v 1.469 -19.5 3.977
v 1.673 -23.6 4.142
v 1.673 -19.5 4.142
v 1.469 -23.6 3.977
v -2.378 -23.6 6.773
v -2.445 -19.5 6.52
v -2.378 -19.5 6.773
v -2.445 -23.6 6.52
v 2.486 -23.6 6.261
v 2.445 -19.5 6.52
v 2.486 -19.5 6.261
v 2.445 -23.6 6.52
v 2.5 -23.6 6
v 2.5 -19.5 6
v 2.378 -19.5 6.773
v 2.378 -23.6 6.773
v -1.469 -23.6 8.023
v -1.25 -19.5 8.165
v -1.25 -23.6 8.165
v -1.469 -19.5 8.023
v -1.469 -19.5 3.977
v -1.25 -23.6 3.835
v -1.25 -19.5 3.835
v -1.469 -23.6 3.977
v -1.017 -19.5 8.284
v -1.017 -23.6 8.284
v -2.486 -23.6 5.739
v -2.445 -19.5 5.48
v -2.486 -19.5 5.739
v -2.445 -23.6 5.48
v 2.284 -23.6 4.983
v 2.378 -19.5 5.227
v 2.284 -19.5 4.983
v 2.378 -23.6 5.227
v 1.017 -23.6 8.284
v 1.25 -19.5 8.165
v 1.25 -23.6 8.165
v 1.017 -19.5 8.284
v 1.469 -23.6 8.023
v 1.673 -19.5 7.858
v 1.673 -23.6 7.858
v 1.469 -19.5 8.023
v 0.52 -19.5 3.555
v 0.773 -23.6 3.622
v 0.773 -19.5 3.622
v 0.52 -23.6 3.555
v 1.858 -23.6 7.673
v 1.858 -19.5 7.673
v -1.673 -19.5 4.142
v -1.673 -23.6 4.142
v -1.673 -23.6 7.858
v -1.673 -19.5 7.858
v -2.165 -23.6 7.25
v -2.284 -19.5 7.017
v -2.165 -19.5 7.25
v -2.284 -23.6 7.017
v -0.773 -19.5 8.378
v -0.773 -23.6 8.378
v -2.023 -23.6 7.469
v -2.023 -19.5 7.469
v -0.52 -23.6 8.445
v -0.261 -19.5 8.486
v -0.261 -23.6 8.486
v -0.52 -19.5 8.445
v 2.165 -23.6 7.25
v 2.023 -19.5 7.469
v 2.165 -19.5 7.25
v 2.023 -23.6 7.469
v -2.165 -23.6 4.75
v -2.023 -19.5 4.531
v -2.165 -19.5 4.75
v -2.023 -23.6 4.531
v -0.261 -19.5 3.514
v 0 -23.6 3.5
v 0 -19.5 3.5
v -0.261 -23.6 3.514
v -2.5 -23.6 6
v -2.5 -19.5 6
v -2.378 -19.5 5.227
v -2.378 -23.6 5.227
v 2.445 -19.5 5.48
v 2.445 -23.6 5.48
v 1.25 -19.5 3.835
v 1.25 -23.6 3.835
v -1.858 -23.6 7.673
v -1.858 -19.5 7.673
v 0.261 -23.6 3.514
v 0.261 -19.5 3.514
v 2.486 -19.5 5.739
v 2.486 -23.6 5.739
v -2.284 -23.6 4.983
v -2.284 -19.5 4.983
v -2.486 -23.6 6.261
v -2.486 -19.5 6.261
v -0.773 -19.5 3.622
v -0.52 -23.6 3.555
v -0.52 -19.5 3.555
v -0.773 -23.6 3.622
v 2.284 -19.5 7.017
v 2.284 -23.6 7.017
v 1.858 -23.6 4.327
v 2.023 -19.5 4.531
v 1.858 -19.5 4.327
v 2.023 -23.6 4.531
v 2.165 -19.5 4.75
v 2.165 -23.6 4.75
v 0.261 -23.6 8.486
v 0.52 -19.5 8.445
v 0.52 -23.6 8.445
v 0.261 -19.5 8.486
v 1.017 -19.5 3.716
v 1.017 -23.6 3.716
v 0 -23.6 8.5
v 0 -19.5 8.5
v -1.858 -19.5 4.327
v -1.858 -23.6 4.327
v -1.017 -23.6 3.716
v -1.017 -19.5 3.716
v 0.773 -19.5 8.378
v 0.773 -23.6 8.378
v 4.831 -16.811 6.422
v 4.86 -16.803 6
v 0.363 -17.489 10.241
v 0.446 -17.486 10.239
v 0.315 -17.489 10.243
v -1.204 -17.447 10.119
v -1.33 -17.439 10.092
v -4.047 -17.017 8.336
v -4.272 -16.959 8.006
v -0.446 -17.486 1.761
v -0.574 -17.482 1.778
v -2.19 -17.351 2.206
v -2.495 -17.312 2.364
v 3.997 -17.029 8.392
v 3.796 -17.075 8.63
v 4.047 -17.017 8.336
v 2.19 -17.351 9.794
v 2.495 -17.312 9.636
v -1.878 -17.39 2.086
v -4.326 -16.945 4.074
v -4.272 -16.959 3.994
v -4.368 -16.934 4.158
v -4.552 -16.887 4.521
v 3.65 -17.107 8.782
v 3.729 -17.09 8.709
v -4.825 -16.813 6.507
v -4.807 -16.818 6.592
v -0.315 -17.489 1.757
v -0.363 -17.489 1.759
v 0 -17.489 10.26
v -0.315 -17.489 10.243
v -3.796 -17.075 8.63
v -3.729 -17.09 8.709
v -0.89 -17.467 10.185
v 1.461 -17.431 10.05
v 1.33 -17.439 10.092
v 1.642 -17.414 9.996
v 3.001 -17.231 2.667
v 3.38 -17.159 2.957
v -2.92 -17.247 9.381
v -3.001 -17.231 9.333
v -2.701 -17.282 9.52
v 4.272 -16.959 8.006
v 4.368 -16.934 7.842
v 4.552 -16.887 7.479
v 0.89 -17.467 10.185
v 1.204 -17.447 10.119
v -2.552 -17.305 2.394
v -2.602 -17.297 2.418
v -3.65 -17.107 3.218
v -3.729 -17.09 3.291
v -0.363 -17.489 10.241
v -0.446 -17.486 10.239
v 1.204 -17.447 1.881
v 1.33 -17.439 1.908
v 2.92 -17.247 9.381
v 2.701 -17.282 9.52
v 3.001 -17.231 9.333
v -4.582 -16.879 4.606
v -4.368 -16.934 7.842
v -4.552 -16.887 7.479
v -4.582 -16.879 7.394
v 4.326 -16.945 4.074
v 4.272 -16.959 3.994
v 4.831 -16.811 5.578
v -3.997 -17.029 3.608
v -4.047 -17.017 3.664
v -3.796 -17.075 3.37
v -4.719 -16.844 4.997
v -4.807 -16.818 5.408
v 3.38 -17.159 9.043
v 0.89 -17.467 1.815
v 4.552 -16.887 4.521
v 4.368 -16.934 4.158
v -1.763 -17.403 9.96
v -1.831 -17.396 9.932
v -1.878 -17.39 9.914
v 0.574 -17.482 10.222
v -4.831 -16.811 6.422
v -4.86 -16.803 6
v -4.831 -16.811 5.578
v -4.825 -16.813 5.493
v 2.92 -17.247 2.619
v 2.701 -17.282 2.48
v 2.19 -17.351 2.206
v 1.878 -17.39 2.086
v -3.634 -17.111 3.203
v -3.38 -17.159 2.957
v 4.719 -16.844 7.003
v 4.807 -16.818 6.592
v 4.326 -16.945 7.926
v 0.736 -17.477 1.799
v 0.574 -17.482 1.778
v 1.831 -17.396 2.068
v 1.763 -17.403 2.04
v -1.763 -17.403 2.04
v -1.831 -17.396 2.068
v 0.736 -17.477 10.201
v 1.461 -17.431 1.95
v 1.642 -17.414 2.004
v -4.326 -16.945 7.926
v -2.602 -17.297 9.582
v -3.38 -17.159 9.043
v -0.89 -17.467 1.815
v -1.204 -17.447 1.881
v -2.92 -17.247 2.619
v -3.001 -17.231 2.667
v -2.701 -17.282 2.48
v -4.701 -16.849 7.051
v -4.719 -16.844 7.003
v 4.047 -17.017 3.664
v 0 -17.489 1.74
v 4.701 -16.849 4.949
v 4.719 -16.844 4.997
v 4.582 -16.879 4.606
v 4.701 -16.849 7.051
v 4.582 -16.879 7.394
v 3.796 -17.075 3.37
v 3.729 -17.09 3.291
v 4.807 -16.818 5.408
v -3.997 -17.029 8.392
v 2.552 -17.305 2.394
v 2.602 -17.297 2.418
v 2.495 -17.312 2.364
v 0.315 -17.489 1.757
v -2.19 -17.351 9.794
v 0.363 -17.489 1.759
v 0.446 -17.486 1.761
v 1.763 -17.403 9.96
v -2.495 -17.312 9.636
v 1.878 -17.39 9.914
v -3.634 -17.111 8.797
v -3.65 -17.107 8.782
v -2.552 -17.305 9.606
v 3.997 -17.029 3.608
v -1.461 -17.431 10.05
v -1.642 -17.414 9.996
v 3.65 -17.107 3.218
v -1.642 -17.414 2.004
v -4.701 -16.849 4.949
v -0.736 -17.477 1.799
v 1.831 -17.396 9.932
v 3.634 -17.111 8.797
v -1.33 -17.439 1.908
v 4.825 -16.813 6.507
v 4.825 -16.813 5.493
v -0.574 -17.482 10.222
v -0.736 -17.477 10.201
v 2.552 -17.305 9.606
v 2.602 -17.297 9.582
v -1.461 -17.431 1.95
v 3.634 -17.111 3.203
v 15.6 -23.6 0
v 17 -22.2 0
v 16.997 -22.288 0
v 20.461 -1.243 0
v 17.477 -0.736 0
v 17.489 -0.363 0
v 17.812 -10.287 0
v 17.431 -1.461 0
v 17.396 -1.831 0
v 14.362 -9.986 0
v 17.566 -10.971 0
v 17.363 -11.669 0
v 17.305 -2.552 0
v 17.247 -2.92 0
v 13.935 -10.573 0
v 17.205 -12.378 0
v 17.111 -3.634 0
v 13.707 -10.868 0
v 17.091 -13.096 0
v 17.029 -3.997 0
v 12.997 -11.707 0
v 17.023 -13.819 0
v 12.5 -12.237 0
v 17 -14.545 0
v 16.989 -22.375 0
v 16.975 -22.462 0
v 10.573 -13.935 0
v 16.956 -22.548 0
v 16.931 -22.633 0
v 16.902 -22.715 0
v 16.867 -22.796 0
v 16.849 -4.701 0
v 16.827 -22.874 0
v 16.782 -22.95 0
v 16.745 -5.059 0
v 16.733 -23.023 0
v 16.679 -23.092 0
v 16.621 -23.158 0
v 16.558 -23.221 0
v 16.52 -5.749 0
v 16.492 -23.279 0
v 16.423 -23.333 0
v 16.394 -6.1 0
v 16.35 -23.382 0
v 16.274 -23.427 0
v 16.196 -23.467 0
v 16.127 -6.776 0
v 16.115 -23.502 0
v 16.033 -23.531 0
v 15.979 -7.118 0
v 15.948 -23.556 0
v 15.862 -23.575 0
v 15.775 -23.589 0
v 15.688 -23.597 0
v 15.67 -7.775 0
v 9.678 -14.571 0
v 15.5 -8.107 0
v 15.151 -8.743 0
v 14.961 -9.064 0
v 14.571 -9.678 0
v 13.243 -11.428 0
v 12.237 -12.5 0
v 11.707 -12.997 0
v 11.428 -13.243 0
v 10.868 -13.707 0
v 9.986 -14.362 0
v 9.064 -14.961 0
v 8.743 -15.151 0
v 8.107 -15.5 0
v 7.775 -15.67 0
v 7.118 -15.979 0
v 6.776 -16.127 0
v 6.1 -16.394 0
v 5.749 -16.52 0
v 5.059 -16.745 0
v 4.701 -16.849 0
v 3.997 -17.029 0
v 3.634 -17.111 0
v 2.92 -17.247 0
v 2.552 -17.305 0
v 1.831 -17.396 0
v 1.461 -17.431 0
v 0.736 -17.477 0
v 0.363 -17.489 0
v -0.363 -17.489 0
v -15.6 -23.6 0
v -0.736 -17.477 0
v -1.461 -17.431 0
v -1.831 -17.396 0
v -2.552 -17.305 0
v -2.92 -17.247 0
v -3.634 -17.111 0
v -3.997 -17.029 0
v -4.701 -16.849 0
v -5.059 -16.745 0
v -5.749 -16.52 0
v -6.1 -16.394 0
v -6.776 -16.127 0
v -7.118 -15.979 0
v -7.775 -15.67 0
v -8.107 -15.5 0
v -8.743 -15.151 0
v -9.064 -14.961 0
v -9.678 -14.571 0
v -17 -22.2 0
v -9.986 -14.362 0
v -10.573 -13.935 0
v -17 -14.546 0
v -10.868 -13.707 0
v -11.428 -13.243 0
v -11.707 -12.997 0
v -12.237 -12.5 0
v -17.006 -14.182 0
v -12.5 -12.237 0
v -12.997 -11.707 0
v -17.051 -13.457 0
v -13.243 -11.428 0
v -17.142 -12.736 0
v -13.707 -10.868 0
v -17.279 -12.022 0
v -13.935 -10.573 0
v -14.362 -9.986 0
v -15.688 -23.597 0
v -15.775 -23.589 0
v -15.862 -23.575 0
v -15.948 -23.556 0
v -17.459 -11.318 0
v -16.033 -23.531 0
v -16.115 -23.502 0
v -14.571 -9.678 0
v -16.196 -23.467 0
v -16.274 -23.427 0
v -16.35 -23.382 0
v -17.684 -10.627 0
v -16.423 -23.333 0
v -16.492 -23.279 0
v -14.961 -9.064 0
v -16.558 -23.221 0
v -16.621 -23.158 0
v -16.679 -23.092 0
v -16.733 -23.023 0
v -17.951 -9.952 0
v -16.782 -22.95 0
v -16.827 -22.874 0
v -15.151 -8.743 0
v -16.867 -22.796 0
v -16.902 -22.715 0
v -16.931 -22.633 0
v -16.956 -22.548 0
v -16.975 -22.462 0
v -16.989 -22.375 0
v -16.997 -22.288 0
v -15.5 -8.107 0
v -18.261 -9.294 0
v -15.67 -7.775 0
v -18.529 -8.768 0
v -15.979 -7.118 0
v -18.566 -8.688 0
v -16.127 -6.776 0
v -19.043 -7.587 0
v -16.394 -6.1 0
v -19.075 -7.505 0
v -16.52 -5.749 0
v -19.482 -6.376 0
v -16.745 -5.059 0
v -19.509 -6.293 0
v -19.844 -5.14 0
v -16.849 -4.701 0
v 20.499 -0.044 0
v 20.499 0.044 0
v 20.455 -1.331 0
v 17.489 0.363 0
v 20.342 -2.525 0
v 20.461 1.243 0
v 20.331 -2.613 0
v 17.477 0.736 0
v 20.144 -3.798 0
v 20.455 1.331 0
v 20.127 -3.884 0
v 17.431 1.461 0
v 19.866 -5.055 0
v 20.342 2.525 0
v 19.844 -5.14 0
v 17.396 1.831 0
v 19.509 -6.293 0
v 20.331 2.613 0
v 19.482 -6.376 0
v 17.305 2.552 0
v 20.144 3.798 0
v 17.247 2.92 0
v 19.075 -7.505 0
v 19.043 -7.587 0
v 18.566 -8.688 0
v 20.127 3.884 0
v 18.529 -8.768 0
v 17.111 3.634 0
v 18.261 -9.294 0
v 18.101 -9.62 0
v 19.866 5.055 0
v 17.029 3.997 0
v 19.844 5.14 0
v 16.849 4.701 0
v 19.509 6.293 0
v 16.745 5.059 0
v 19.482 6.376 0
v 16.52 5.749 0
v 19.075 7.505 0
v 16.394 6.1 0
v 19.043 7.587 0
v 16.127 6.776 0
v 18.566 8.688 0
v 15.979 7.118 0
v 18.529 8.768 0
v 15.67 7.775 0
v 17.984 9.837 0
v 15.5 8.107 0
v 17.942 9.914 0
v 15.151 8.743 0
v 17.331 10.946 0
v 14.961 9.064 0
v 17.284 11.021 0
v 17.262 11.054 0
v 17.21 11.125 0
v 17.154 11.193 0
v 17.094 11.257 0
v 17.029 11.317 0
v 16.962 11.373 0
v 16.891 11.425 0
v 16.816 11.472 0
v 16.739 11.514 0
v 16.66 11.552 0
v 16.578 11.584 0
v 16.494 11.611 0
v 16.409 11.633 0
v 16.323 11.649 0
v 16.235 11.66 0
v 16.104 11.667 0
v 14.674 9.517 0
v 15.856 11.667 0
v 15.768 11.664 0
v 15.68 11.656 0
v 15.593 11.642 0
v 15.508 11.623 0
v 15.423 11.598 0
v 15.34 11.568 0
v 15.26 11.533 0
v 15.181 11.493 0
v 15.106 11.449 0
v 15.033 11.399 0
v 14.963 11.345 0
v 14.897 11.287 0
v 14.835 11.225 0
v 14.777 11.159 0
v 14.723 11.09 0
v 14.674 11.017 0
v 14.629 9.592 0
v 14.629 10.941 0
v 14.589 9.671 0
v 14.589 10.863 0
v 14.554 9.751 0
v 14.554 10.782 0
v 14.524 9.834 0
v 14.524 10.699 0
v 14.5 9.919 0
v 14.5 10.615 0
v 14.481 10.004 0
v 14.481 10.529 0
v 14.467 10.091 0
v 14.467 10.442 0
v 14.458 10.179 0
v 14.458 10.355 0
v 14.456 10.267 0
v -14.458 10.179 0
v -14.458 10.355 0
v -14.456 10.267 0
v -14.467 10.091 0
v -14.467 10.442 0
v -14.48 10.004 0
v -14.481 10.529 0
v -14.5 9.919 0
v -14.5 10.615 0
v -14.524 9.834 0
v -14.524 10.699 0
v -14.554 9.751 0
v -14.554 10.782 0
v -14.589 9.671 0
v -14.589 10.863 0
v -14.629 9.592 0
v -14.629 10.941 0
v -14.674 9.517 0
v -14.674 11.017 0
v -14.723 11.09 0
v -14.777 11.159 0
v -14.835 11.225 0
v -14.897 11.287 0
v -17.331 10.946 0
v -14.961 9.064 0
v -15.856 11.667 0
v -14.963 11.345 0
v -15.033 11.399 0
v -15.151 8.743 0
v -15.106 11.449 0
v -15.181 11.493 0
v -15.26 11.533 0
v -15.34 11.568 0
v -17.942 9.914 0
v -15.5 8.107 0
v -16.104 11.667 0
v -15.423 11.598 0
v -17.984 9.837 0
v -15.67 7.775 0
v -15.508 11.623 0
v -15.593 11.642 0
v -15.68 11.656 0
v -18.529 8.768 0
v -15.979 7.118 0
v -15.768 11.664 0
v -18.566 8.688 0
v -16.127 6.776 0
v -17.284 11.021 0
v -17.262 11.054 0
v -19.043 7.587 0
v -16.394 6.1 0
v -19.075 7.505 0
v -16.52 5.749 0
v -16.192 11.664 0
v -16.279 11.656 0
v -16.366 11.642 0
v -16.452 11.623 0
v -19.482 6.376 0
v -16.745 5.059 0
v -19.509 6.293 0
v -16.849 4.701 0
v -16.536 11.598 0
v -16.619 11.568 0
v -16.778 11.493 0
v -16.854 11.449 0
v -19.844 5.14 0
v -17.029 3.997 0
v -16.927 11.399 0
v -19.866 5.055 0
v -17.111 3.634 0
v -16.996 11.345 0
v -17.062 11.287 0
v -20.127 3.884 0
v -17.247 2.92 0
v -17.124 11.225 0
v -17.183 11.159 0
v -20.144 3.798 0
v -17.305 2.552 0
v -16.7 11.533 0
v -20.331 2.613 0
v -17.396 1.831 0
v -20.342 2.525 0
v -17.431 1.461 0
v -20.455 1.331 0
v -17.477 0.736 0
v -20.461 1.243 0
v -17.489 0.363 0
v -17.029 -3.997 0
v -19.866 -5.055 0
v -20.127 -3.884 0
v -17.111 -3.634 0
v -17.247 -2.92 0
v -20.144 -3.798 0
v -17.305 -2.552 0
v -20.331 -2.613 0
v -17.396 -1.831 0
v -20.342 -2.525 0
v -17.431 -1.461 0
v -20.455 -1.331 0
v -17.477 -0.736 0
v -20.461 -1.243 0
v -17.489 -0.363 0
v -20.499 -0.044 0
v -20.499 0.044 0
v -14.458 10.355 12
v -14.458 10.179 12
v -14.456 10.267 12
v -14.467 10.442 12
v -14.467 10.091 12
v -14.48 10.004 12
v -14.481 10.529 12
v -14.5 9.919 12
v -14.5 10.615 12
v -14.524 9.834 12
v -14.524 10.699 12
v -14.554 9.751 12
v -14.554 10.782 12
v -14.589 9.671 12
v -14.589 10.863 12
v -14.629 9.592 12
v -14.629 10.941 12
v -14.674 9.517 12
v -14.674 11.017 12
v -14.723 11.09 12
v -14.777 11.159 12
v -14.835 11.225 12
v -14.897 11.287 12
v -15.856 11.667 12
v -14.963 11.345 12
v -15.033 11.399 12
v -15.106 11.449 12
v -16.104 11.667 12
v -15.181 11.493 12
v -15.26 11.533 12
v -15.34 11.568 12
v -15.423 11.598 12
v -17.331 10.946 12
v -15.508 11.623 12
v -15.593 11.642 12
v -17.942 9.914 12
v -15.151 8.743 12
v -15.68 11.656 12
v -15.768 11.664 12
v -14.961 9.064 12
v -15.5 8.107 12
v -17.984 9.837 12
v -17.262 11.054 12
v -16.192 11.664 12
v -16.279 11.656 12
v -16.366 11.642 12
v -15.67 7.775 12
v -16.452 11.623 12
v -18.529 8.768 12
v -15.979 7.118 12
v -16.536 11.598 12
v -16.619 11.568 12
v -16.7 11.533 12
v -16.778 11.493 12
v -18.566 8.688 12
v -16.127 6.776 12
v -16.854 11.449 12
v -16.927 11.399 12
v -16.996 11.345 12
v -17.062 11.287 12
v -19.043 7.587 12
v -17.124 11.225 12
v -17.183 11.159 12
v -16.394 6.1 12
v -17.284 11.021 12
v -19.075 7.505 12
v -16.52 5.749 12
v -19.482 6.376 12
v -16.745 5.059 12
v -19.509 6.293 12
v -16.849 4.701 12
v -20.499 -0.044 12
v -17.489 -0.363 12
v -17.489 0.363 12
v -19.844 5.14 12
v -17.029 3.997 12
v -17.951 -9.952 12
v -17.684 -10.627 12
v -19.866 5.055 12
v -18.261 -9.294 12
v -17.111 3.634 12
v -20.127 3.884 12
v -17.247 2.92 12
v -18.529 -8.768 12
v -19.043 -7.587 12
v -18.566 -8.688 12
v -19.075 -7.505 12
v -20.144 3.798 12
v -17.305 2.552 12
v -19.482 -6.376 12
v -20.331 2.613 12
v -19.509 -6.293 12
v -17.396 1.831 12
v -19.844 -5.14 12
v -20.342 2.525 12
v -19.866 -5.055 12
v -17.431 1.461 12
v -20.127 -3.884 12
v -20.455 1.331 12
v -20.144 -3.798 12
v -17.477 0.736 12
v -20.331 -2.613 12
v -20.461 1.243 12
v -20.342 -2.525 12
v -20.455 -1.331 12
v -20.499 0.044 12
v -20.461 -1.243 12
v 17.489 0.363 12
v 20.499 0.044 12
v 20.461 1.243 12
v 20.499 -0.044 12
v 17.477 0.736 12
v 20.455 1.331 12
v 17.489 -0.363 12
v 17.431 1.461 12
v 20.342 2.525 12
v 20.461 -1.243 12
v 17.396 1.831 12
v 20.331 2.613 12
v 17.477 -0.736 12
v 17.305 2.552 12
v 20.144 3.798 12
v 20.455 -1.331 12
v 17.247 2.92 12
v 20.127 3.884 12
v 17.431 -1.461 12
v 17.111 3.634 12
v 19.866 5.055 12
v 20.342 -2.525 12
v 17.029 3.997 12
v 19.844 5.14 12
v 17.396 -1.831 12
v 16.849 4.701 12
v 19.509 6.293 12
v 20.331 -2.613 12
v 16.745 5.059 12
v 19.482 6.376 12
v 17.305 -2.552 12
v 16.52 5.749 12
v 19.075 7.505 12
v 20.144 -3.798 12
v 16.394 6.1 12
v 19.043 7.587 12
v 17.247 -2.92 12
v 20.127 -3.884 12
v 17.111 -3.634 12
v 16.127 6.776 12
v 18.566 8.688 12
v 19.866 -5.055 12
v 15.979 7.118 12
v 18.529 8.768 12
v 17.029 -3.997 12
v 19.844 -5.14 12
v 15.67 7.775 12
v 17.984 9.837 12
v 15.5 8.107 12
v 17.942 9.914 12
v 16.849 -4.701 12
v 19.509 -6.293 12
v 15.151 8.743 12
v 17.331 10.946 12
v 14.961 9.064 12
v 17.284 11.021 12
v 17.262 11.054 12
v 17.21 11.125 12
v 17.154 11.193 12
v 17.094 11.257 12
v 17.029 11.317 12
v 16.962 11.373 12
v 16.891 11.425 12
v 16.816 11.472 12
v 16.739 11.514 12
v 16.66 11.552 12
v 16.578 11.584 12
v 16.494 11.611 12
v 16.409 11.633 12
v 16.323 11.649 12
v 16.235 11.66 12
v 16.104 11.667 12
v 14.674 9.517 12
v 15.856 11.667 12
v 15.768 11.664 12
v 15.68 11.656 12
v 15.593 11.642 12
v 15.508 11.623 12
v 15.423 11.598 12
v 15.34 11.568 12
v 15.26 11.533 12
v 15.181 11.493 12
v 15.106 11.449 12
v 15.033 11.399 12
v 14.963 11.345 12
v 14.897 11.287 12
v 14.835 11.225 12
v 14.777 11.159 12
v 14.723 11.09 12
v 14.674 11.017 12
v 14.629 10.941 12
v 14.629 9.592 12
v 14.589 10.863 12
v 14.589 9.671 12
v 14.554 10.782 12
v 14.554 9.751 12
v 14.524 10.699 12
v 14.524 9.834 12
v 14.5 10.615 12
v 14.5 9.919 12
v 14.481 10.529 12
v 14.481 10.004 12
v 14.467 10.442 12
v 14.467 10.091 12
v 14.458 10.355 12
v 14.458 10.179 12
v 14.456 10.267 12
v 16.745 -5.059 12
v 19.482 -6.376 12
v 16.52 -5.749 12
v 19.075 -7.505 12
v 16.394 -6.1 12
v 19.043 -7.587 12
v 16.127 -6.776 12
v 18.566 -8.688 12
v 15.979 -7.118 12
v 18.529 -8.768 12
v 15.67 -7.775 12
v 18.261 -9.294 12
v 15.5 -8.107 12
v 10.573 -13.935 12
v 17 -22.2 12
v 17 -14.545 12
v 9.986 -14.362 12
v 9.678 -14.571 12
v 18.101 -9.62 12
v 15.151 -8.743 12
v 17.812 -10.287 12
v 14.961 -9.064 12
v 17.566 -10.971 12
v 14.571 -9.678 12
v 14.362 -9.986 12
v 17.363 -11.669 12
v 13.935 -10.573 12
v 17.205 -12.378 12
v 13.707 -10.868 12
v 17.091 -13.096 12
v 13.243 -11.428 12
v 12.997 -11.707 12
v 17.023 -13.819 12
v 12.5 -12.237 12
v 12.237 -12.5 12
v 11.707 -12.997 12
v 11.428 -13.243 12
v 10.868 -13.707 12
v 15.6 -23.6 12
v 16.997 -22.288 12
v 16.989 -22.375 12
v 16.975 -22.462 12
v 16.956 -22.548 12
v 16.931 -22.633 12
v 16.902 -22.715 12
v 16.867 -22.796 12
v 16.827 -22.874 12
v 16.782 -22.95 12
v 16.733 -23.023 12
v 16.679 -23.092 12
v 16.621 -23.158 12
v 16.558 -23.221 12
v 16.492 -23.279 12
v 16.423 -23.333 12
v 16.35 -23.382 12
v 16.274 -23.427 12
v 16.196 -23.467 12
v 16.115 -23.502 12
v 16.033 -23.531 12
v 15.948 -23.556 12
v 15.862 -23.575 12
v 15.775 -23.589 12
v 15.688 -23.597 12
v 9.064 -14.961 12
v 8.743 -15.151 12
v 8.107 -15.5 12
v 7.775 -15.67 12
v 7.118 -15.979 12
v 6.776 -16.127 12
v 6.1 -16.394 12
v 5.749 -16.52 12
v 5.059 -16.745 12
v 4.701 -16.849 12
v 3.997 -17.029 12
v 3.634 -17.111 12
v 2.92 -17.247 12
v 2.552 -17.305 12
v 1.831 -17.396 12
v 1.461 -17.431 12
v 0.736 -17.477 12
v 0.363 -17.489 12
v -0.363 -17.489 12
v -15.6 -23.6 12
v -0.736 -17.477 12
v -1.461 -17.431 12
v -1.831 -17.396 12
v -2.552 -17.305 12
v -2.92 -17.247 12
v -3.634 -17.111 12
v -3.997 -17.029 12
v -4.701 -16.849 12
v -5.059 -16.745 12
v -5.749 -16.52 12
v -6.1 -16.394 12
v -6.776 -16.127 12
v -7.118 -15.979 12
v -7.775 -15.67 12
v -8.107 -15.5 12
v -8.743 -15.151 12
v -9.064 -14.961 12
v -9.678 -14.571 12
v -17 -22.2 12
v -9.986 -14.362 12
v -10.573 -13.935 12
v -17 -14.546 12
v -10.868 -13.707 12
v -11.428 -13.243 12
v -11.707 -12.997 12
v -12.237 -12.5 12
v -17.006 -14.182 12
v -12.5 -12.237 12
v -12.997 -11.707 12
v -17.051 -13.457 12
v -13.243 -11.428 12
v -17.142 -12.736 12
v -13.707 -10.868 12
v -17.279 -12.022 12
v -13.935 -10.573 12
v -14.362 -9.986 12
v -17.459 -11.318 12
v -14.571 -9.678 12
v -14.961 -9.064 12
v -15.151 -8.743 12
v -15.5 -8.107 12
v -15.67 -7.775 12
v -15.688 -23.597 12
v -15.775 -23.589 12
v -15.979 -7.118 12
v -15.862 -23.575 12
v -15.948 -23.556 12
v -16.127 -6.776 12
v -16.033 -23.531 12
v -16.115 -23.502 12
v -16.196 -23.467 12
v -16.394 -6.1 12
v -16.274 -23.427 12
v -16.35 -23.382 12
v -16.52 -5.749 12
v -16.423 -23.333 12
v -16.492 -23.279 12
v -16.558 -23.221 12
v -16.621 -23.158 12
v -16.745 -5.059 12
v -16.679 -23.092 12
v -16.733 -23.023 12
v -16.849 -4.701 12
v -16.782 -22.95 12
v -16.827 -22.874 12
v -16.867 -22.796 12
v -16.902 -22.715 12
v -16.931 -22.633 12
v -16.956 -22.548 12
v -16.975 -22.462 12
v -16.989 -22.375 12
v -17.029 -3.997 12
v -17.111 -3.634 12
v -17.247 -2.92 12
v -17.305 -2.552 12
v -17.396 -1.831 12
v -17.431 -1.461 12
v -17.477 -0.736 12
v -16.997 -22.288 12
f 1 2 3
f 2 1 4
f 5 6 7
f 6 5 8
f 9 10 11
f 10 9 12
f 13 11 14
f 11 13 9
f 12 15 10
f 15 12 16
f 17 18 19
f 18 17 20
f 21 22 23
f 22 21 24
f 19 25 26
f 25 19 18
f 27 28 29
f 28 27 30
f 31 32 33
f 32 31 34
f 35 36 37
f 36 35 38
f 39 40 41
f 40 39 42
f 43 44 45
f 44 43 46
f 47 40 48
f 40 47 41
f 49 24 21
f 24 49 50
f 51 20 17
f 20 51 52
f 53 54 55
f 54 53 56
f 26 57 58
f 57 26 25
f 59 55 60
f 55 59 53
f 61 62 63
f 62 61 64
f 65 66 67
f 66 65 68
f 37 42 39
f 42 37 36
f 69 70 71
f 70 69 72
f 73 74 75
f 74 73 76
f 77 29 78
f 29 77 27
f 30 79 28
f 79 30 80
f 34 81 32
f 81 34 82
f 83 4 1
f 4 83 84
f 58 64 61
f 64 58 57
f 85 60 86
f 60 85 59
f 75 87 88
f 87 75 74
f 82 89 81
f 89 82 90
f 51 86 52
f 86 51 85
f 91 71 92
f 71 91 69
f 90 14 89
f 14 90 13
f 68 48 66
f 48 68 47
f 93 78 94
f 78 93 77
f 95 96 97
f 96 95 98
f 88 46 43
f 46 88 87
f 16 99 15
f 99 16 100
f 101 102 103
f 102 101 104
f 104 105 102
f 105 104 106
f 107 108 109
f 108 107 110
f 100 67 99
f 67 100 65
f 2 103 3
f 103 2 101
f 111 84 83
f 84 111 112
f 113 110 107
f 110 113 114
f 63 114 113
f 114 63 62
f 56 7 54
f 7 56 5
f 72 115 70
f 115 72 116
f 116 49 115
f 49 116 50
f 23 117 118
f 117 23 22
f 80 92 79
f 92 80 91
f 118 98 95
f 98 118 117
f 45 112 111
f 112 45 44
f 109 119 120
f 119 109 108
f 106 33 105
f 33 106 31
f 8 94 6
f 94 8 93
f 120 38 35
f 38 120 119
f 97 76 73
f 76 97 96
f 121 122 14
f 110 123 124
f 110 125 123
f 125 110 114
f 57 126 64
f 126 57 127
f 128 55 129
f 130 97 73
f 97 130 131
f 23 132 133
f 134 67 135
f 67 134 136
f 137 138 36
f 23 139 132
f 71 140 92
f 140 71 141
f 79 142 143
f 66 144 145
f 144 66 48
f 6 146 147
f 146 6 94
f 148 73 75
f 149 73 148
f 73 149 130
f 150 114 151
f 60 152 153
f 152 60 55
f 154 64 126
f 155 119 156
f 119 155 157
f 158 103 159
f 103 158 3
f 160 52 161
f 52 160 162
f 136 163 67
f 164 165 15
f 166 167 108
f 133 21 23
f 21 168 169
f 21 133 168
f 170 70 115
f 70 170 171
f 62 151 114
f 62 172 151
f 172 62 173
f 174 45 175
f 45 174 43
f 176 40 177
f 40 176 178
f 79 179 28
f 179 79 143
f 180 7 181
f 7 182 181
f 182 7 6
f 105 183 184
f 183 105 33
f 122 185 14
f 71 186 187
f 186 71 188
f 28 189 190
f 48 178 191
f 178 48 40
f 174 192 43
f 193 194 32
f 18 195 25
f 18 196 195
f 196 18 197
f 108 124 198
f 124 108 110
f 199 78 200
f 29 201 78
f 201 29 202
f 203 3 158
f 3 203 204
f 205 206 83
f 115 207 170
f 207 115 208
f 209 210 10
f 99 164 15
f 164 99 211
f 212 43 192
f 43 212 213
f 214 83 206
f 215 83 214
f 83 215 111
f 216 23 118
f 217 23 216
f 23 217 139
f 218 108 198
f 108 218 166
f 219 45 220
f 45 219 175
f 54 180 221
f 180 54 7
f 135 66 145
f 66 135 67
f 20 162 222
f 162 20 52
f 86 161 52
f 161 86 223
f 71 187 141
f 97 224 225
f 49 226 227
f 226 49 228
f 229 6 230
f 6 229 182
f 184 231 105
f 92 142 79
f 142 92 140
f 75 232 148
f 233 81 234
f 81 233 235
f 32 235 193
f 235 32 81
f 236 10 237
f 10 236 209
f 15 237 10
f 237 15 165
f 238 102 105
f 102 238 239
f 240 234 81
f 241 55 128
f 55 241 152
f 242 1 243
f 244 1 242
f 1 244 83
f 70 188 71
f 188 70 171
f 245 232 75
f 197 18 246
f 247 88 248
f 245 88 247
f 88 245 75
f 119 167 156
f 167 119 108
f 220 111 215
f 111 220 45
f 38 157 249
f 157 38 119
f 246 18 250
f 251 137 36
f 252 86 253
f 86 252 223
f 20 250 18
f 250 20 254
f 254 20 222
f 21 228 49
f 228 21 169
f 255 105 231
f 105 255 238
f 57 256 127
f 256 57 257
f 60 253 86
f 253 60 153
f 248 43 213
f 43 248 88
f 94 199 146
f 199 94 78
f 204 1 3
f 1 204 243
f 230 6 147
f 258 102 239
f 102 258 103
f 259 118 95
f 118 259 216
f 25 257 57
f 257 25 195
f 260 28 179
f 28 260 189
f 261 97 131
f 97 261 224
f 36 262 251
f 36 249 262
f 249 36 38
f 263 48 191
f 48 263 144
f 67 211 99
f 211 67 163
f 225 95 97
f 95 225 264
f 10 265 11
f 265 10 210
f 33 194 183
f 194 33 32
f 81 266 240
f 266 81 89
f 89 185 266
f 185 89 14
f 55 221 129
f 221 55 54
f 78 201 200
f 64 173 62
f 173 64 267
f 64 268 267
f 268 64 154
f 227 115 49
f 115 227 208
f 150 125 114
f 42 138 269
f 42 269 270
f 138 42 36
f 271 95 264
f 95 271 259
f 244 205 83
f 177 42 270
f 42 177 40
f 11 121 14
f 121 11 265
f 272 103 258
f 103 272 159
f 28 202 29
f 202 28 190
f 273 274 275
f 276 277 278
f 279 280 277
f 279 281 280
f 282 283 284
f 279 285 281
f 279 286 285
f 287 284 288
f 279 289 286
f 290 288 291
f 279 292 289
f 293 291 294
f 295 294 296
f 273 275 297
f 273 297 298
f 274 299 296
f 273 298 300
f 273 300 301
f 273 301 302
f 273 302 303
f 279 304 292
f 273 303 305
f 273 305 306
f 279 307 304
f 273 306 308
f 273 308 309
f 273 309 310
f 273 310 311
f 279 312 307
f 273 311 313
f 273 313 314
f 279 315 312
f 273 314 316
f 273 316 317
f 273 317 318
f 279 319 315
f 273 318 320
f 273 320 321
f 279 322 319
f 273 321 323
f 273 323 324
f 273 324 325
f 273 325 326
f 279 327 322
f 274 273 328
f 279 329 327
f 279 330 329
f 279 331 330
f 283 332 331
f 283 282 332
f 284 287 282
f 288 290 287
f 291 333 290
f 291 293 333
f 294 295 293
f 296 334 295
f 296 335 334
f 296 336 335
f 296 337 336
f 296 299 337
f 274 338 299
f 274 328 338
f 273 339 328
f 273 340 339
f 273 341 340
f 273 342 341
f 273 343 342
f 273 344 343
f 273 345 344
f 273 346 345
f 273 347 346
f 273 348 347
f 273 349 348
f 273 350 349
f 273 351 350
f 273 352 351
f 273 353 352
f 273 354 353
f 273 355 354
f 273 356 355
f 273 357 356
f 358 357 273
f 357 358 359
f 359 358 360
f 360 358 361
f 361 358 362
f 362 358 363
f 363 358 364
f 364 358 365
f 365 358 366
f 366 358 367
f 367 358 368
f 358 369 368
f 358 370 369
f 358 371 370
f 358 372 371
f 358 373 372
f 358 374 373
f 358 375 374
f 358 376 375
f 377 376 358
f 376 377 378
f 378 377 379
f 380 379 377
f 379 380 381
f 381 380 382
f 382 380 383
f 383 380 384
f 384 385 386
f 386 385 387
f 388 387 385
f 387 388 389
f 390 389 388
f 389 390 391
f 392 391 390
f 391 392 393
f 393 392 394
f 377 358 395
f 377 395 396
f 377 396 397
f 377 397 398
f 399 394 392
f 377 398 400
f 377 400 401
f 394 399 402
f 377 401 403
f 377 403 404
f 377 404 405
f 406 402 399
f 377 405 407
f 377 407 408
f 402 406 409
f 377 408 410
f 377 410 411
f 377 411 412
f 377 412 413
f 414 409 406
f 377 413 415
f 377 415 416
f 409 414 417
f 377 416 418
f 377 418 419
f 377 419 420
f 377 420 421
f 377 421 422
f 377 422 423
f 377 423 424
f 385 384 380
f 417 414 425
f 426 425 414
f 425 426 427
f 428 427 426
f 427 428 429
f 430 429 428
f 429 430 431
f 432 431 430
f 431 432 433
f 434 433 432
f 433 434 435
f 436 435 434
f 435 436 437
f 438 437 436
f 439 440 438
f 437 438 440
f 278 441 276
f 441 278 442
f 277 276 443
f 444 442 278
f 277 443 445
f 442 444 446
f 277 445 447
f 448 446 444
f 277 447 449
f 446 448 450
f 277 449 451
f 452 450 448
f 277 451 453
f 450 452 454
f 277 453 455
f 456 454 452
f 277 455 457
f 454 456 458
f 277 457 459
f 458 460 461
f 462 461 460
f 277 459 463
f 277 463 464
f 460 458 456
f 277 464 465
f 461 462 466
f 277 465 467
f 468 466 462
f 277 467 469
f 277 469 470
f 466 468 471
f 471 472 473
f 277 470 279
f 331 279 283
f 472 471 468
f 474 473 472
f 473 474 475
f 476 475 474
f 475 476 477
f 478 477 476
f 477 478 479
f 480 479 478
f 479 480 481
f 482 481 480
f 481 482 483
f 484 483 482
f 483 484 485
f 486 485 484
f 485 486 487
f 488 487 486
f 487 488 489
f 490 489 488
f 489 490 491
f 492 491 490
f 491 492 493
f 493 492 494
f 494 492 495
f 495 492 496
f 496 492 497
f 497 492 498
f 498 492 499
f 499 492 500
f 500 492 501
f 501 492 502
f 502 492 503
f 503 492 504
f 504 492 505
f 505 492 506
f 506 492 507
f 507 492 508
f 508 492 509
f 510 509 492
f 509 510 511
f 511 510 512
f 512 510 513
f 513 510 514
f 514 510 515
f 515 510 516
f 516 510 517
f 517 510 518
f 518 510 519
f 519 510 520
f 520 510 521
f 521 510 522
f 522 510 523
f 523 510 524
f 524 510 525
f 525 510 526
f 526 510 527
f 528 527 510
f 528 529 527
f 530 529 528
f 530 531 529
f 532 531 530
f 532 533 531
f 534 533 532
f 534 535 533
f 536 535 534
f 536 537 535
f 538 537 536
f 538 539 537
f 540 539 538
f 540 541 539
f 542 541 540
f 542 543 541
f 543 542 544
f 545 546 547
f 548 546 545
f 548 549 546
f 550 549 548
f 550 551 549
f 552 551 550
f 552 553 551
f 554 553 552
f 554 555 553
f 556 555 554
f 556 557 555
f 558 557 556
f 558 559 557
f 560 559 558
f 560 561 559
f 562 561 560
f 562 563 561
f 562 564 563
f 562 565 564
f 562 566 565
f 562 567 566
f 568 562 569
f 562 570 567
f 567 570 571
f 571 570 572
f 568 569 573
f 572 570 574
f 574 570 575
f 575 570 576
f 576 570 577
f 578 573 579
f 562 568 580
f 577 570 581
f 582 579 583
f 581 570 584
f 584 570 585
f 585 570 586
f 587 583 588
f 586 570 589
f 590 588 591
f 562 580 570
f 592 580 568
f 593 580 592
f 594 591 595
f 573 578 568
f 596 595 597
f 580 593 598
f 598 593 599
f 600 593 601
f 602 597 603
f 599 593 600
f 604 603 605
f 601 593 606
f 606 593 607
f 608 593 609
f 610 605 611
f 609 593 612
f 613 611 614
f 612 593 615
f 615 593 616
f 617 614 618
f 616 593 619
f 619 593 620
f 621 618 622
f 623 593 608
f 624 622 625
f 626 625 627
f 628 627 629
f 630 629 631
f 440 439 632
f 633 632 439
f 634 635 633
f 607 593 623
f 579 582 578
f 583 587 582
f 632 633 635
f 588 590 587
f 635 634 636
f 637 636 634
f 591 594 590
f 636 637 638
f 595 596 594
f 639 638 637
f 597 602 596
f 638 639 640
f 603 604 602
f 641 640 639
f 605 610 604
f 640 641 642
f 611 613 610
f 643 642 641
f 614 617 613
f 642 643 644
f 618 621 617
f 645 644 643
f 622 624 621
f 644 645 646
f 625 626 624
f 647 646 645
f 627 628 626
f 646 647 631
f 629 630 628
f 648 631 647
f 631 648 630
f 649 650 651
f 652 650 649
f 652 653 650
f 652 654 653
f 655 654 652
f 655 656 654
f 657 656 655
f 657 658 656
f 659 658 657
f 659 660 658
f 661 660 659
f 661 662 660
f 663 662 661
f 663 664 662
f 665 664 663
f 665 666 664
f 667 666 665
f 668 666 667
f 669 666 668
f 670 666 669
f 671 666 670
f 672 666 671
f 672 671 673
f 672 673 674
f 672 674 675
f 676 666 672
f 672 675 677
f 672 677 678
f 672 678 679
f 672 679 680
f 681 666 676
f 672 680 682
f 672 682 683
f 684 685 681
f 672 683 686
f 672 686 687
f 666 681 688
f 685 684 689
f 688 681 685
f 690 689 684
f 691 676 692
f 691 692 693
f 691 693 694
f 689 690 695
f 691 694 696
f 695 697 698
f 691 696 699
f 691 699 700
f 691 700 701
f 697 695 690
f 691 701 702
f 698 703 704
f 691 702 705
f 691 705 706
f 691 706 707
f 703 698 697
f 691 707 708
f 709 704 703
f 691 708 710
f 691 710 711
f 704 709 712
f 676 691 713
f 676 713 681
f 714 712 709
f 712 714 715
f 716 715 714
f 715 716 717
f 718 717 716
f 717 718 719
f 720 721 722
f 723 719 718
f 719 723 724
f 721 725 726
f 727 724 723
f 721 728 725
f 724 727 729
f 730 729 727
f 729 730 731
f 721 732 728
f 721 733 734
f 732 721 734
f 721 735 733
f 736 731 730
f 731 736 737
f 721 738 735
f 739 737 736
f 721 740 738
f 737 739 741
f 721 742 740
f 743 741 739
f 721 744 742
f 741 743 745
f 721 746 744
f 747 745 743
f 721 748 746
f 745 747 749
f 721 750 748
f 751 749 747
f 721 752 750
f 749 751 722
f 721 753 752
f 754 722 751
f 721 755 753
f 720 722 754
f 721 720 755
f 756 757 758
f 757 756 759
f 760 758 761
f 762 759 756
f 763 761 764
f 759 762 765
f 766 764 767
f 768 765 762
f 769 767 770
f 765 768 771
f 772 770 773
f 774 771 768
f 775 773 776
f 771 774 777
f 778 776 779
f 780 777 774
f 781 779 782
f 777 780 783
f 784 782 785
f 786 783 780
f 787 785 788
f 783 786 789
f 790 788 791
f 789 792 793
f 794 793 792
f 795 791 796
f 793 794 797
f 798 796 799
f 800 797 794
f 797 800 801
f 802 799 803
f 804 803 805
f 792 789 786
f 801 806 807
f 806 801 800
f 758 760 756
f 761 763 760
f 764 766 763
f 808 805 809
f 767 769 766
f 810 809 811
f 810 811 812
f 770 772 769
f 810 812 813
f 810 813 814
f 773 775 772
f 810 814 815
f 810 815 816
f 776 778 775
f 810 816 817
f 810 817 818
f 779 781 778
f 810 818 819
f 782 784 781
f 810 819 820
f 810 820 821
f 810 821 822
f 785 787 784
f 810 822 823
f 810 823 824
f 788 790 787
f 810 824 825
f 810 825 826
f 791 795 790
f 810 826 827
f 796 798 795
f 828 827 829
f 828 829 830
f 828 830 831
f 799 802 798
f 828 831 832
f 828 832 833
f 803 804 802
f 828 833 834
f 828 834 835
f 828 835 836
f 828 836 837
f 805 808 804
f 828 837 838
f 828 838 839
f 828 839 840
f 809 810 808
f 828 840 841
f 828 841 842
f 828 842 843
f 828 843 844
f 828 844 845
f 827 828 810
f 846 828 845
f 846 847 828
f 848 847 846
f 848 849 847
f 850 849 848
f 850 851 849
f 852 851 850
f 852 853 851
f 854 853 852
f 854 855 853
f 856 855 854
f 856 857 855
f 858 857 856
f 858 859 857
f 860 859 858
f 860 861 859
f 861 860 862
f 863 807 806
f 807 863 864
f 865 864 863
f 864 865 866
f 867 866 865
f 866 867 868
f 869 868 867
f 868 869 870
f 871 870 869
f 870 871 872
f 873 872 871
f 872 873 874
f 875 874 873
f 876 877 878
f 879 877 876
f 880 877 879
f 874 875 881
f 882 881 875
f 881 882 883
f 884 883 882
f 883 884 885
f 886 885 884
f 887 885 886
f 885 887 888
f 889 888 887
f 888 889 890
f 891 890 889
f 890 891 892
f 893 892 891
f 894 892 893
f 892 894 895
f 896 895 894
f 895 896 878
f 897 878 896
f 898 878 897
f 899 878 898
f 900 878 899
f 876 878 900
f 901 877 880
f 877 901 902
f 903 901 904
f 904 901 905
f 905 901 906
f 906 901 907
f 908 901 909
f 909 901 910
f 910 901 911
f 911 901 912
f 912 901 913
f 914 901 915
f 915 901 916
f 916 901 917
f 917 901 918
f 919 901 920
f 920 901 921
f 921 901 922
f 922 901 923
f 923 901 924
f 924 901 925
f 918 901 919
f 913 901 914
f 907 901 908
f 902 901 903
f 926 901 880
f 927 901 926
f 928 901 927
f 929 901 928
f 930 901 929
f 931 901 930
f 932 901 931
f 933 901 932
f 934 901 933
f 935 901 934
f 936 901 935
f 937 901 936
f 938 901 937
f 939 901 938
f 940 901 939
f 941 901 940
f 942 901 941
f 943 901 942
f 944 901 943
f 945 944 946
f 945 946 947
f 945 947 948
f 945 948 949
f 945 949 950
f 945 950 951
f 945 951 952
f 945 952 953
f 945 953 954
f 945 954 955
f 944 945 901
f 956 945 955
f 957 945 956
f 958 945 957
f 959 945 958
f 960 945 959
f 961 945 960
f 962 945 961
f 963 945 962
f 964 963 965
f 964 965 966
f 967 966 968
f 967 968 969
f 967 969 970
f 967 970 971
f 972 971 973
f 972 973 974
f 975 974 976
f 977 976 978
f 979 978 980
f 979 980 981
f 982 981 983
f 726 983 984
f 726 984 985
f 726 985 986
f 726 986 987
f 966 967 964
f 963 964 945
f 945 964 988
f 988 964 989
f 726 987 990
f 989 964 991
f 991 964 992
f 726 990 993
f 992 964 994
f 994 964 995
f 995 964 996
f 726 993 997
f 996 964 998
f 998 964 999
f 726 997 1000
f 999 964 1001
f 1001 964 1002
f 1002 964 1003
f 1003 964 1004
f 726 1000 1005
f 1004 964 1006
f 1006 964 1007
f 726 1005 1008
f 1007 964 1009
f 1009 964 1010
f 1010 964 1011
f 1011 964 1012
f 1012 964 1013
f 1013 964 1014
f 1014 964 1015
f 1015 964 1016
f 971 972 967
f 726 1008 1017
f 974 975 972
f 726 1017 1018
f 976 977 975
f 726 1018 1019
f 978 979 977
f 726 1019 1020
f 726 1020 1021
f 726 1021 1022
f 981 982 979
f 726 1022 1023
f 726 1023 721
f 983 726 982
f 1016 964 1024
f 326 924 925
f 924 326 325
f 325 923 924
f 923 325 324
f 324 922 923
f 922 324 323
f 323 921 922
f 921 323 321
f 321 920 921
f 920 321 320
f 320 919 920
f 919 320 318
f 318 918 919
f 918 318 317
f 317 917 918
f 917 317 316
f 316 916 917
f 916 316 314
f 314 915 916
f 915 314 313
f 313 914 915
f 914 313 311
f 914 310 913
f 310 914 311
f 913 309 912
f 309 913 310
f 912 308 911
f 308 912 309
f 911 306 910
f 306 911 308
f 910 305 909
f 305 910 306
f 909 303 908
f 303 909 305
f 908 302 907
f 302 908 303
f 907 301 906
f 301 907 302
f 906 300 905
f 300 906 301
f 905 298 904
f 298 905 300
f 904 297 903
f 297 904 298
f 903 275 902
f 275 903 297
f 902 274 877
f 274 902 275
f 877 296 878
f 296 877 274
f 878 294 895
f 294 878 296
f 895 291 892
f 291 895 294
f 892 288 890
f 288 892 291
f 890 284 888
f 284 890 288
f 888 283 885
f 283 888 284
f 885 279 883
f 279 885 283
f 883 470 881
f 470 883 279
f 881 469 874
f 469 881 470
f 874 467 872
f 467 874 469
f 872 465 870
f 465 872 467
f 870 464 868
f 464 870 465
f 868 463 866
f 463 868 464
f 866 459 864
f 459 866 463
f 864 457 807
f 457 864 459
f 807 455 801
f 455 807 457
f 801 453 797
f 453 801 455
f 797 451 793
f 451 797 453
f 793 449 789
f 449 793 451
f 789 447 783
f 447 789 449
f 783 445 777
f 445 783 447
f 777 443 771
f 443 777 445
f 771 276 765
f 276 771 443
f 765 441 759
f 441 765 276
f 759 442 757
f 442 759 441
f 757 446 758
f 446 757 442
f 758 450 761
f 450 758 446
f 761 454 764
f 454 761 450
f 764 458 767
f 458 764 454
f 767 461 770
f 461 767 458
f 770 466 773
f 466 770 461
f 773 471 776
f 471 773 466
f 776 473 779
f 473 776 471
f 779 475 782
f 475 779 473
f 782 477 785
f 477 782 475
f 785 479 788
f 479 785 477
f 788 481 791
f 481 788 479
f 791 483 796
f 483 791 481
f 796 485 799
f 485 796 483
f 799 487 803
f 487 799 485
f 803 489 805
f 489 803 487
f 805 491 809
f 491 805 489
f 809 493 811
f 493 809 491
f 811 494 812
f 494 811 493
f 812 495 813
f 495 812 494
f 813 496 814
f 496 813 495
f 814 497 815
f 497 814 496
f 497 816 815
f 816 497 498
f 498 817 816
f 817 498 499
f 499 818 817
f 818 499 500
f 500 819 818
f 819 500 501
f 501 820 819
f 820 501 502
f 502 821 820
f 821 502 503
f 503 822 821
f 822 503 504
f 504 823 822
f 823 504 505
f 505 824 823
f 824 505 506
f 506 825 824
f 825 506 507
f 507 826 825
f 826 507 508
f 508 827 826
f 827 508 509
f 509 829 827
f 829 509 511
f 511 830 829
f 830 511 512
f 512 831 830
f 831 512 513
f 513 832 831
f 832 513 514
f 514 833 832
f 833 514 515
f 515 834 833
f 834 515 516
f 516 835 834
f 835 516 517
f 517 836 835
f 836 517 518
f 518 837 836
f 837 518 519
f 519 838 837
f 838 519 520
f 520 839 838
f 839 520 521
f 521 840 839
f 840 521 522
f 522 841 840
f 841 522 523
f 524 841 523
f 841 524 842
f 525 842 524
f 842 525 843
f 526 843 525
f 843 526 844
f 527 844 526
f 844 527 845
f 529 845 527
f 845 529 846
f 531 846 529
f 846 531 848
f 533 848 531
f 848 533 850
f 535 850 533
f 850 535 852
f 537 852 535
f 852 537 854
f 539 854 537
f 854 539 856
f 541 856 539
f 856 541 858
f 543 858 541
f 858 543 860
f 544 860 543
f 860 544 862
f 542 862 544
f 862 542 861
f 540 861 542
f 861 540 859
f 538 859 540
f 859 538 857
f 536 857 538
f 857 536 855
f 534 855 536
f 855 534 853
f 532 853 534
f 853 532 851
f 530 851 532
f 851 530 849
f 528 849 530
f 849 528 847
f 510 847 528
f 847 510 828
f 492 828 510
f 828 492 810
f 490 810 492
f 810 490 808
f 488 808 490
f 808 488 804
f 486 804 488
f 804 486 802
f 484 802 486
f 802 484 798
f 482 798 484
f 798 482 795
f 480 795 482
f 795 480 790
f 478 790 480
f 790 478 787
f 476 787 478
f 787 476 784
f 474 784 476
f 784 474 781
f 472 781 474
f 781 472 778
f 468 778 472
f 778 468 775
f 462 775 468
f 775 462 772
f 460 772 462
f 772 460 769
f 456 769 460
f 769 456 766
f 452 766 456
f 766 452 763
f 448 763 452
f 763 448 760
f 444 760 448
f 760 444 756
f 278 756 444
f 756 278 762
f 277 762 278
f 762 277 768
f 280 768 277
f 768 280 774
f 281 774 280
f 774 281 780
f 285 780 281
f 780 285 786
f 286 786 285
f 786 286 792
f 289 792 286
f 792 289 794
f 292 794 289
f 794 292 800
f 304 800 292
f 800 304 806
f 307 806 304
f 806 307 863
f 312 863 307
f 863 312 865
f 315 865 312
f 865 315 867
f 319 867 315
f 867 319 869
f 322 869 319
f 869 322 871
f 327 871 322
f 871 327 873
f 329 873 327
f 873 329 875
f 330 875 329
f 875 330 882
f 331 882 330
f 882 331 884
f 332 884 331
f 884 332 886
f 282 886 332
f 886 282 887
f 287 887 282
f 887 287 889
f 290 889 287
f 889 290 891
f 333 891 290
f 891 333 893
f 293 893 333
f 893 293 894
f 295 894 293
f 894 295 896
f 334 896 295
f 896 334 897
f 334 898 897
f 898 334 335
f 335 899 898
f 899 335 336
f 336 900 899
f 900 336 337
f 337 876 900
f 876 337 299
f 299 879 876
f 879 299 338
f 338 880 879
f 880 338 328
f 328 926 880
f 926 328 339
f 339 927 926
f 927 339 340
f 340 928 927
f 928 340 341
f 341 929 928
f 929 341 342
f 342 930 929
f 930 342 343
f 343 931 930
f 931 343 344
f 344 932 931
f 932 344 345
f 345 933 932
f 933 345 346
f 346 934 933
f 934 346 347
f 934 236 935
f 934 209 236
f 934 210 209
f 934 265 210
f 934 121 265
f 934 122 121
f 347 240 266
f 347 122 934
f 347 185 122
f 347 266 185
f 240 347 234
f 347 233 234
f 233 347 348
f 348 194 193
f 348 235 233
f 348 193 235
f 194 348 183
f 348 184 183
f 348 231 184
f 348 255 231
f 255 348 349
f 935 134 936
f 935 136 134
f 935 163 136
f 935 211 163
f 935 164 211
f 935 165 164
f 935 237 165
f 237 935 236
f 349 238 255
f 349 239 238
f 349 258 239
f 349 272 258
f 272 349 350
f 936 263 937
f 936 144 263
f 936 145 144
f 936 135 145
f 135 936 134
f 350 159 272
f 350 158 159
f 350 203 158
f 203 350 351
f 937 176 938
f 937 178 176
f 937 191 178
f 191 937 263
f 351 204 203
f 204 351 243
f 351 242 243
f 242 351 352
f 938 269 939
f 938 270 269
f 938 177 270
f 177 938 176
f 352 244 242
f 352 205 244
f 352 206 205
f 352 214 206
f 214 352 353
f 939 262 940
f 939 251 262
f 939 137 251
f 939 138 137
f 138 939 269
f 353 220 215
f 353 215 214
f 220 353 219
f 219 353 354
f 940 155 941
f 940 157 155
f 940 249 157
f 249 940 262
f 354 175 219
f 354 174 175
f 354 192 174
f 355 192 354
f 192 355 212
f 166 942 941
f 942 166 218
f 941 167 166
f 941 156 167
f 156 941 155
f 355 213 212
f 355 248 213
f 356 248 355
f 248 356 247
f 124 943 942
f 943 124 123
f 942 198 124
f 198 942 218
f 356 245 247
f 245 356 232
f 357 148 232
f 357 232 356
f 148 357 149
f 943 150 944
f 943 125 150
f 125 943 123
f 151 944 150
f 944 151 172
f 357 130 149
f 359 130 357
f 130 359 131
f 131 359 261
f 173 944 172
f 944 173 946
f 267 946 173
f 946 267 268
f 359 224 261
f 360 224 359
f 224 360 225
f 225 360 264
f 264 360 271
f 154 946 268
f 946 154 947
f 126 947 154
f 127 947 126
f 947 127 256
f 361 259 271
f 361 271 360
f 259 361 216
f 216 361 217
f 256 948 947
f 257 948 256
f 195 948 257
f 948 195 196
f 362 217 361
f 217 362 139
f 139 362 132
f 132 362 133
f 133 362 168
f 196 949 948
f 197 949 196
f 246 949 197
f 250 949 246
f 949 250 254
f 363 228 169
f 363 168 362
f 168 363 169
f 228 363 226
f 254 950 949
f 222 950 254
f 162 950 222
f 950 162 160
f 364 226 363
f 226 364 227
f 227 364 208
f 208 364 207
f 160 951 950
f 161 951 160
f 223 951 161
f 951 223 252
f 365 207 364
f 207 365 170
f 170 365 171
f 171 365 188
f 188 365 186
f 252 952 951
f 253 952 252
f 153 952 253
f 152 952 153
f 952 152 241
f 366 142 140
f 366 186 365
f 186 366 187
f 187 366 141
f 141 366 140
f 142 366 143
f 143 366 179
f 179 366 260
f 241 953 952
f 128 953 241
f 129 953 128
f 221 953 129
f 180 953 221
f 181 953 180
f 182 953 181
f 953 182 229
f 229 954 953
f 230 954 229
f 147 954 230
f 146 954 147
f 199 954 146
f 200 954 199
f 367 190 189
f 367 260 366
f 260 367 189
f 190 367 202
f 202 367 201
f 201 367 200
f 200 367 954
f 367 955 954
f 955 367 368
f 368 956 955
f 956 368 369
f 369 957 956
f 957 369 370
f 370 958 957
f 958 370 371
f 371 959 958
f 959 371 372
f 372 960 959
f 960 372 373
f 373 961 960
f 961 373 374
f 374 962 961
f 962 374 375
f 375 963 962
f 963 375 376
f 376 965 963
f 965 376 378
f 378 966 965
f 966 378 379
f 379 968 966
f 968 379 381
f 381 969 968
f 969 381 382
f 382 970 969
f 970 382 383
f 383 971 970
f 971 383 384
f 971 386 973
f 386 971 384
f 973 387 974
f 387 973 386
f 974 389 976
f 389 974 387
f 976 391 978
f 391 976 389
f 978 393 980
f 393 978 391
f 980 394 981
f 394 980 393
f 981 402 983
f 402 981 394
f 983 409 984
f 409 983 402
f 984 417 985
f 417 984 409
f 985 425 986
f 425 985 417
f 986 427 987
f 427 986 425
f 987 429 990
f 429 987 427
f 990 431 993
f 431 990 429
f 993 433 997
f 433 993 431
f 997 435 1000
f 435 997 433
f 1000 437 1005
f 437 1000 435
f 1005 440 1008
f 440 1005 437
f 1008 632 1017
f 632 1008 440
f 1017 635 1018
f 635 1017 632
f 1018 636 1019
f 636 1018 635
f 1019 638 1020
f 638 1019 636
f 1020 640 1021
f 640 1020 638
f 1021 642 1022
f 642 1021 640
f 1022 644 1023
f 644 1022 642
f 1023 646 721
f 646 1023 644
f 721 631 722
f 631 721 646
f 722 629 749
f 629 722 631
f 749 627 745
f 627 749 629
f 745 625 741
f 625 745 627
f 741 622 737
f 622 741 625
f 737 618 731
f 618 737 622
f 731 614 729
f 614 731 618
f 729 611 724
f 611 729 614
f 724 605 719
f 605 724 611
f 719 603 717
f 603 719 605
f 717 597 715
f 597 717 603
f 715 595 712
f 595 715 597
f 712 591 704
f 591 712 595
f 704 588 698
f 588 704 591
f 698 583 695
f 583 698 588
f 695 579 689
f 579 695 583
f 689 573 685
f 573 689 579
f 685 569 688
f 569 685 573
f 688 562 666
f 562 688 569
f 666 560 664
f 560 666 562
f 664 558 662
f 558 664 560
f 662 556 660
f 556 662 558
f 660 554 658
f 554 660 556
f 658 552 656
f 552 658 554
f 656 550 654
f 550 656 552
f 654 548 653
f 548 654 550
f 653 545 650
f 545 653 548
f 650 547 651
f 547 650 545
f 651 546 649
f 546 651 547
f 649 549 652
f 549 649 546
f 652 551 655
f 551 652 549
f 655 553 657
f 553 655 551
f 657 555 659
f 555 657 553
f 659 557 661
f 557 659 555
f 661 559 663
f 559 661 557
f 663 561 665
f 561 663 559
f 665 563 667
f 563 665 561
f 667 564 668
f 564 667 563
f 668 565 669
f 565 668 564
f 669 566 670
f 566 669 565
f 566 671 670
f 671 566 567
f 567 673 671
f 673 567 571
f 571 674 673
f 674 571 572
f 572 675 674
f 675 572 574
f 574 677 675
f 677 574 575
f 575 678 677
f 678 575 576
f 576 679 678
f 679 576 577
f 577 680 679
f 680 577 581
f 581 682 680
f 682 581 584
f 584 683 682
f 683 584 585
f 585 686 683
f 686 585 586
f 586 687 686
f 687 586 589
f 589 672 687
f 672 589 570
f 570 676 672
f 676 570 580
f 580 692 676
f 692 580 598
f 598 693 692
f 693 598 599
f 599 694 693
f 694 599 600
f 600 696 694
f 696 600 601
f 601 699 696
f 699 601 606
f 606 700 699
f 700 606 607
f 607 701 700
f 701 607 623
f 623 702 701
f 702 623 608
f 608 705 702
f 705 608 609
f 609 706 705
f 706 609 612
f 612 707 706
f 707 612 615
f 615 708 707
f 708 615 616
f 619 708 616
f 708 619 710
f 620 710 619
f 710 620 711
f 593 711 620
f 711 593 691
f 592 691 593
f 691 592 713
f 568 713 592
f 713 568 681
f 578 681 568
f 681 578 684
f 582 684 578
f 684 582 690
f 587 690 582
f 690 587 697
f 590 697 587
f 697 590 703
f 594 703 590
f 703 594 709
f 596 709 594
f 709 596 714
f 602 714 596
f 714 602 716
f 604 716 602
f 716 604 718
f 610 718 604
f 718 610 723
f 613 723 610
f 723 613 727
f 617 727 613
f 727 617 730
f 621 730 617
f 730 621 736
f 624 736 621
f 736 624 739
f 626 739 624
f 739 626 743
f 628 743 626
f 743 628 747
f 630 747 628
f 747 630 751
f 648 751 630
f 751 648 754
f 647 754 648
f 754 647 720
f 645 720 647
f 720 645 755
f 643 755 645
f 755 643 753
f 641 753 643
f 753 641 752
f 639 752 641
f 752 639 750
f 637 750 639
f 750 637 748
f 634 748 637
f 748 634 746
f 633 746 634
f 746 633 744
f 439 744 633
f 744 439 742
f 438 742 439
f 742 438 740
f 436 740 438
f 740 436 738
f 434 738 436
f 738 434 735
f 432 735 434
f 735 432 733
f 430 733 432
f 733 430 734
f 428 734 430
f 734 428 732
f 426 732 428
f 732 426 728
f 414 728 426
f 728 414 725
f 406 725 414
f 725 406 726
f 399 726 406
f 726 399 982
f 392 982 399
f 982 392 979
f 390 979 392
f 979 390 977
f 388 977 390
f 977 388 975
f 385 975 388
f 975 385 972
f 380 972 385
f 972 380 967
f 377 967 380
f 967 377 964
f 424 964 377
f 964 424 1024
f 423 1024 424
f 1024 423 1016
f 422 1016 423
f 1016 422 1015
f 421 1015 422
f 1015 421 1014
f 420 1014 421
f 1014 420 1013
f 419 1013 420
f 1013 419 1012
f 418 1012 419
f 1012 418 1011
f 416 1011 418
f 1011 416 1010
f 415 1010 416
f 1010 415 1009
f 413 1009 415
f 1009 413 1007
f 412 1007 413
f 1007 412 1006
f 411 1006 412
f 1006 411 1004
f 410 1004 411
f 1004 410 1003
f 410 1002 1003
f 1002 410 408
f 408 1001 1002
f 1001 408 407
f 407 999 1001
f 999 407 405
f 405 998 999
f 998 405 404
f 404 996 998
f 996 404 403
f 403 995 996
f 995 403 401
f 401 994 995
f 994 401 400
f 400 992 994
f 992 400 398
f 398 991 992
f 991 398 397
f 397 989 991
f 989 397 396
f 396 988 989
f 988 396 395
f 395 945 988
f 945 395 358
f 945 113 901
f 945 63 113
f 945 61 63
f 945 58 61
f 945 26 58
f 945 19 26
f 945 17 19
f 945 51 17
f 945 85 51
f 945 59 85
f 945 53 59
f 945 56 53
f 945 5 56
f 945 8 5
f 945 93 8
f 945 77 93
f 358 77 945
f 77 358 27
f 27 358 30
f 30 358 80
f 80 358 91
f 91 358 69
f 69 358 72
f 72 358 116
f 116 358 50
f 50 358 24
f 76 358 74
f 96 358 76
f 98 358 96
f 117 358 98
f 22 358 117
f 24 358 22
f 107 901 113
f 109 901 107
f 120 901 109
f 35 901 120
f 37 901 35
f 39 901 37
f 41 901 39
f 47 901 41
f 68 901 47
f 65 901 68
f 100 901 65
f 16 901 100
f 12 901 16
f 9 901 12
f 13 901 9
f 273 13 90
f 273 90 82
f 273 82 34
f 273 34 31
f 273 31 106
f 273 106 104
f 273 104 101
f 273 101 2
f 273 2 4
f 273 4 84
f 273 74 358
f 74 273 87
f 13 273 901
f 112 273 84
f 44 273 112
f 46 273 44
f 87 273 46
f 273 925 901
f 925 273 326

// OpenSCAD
///OpenSCAD version 2015.03-2/////////////////// 
////////////////////////////////////////////////
// OpenSCAD File V2.0 by Ken_Applications //////
/////          27 - 12 - 2018              /////
/////            with hole                 /////
////////////////////////////////////////////////
////////////////////////////////////////////////

Diameter_to_grip=35;
Number_of_clips=1;
clip_height=12;
width_of_base=34;
depth_of_base=6;
clip_wall_thickness=3;
center_line_distance=56;

hole=5;


module contor1(){
 translate([0,-dist_from_cl,0]) square([width_of_base,depth_of_base],true);
 contor();
}


////calculations//////////////
the_fillet_r=(clip_wall_thickness/2)-0.1;
outer_dia=Diameter_to_grip+(2*clip_wall_thickness);
dist_from_cl=((Diameter_to_grip/2)+(depth_of_base/2))+0.1;
grip_offset=Diameter_to_grip/3;
blend_radius=(Diameter_to_grip/3)-0.1;
move_bit=(Diameter_to_grip/2)+depth_of_base;
//////////////////////////////


module clip_cyl(){
difference(){
cylinder(h=2, d1=outer_dia, d2=outer_dia, center=false,$fn=100);
translate([0,0,-1])cylinder(h=clip_height, d1=Diameter_to_grip, d2=Diameter_to_grip, center=false,$fn=100);
translate([-width_of_base,grip_offset,-1]) cube([width_of_base*2,width_of_base,2],false);
    }
}

module contor(){
projection(cut = true) 
clip_cyl();
}

module fillet(r) {
   offset(r = -r) {
     offset(delta = r) {
       contor1();
     }
   }
}

module fillet2(r) {
   offset(r = -r) {
     offset(delta = r) {
       clip();
     }
   }
}

module clip(){
fillet(blend_radius,false,$fn=100);
}

module clip_without_hole(){
linear_extrude(height=clip_height)
    fillet2(-the_fillet_r,false,$fn=100);
}


module finish(){
clip_without_hole();

for (x = [1:1:Number_of_clips-1] ){
translate([-x*center_line_distance,0,0]) clip_without_hole();
translate([-x*center_line_distance,-move_bit,0]) cube([x*center_line_distance,depth_of_base,clip_height],false);
}
}

difference(){
finish();
rotate([90,0,0])
translate([0,clip_height/2,Diameter_to_grip/2+depth_of_base]){
cylinder(h=depth_of_base*2+.5, d1=hole, d2=hole, center=true,$fn=60);
    
 translate([0,0,-depth_of_base]) cylinder(h=4, d1=hole*2.4, d2=hole, center=true,$fn=60); 
}  
}
